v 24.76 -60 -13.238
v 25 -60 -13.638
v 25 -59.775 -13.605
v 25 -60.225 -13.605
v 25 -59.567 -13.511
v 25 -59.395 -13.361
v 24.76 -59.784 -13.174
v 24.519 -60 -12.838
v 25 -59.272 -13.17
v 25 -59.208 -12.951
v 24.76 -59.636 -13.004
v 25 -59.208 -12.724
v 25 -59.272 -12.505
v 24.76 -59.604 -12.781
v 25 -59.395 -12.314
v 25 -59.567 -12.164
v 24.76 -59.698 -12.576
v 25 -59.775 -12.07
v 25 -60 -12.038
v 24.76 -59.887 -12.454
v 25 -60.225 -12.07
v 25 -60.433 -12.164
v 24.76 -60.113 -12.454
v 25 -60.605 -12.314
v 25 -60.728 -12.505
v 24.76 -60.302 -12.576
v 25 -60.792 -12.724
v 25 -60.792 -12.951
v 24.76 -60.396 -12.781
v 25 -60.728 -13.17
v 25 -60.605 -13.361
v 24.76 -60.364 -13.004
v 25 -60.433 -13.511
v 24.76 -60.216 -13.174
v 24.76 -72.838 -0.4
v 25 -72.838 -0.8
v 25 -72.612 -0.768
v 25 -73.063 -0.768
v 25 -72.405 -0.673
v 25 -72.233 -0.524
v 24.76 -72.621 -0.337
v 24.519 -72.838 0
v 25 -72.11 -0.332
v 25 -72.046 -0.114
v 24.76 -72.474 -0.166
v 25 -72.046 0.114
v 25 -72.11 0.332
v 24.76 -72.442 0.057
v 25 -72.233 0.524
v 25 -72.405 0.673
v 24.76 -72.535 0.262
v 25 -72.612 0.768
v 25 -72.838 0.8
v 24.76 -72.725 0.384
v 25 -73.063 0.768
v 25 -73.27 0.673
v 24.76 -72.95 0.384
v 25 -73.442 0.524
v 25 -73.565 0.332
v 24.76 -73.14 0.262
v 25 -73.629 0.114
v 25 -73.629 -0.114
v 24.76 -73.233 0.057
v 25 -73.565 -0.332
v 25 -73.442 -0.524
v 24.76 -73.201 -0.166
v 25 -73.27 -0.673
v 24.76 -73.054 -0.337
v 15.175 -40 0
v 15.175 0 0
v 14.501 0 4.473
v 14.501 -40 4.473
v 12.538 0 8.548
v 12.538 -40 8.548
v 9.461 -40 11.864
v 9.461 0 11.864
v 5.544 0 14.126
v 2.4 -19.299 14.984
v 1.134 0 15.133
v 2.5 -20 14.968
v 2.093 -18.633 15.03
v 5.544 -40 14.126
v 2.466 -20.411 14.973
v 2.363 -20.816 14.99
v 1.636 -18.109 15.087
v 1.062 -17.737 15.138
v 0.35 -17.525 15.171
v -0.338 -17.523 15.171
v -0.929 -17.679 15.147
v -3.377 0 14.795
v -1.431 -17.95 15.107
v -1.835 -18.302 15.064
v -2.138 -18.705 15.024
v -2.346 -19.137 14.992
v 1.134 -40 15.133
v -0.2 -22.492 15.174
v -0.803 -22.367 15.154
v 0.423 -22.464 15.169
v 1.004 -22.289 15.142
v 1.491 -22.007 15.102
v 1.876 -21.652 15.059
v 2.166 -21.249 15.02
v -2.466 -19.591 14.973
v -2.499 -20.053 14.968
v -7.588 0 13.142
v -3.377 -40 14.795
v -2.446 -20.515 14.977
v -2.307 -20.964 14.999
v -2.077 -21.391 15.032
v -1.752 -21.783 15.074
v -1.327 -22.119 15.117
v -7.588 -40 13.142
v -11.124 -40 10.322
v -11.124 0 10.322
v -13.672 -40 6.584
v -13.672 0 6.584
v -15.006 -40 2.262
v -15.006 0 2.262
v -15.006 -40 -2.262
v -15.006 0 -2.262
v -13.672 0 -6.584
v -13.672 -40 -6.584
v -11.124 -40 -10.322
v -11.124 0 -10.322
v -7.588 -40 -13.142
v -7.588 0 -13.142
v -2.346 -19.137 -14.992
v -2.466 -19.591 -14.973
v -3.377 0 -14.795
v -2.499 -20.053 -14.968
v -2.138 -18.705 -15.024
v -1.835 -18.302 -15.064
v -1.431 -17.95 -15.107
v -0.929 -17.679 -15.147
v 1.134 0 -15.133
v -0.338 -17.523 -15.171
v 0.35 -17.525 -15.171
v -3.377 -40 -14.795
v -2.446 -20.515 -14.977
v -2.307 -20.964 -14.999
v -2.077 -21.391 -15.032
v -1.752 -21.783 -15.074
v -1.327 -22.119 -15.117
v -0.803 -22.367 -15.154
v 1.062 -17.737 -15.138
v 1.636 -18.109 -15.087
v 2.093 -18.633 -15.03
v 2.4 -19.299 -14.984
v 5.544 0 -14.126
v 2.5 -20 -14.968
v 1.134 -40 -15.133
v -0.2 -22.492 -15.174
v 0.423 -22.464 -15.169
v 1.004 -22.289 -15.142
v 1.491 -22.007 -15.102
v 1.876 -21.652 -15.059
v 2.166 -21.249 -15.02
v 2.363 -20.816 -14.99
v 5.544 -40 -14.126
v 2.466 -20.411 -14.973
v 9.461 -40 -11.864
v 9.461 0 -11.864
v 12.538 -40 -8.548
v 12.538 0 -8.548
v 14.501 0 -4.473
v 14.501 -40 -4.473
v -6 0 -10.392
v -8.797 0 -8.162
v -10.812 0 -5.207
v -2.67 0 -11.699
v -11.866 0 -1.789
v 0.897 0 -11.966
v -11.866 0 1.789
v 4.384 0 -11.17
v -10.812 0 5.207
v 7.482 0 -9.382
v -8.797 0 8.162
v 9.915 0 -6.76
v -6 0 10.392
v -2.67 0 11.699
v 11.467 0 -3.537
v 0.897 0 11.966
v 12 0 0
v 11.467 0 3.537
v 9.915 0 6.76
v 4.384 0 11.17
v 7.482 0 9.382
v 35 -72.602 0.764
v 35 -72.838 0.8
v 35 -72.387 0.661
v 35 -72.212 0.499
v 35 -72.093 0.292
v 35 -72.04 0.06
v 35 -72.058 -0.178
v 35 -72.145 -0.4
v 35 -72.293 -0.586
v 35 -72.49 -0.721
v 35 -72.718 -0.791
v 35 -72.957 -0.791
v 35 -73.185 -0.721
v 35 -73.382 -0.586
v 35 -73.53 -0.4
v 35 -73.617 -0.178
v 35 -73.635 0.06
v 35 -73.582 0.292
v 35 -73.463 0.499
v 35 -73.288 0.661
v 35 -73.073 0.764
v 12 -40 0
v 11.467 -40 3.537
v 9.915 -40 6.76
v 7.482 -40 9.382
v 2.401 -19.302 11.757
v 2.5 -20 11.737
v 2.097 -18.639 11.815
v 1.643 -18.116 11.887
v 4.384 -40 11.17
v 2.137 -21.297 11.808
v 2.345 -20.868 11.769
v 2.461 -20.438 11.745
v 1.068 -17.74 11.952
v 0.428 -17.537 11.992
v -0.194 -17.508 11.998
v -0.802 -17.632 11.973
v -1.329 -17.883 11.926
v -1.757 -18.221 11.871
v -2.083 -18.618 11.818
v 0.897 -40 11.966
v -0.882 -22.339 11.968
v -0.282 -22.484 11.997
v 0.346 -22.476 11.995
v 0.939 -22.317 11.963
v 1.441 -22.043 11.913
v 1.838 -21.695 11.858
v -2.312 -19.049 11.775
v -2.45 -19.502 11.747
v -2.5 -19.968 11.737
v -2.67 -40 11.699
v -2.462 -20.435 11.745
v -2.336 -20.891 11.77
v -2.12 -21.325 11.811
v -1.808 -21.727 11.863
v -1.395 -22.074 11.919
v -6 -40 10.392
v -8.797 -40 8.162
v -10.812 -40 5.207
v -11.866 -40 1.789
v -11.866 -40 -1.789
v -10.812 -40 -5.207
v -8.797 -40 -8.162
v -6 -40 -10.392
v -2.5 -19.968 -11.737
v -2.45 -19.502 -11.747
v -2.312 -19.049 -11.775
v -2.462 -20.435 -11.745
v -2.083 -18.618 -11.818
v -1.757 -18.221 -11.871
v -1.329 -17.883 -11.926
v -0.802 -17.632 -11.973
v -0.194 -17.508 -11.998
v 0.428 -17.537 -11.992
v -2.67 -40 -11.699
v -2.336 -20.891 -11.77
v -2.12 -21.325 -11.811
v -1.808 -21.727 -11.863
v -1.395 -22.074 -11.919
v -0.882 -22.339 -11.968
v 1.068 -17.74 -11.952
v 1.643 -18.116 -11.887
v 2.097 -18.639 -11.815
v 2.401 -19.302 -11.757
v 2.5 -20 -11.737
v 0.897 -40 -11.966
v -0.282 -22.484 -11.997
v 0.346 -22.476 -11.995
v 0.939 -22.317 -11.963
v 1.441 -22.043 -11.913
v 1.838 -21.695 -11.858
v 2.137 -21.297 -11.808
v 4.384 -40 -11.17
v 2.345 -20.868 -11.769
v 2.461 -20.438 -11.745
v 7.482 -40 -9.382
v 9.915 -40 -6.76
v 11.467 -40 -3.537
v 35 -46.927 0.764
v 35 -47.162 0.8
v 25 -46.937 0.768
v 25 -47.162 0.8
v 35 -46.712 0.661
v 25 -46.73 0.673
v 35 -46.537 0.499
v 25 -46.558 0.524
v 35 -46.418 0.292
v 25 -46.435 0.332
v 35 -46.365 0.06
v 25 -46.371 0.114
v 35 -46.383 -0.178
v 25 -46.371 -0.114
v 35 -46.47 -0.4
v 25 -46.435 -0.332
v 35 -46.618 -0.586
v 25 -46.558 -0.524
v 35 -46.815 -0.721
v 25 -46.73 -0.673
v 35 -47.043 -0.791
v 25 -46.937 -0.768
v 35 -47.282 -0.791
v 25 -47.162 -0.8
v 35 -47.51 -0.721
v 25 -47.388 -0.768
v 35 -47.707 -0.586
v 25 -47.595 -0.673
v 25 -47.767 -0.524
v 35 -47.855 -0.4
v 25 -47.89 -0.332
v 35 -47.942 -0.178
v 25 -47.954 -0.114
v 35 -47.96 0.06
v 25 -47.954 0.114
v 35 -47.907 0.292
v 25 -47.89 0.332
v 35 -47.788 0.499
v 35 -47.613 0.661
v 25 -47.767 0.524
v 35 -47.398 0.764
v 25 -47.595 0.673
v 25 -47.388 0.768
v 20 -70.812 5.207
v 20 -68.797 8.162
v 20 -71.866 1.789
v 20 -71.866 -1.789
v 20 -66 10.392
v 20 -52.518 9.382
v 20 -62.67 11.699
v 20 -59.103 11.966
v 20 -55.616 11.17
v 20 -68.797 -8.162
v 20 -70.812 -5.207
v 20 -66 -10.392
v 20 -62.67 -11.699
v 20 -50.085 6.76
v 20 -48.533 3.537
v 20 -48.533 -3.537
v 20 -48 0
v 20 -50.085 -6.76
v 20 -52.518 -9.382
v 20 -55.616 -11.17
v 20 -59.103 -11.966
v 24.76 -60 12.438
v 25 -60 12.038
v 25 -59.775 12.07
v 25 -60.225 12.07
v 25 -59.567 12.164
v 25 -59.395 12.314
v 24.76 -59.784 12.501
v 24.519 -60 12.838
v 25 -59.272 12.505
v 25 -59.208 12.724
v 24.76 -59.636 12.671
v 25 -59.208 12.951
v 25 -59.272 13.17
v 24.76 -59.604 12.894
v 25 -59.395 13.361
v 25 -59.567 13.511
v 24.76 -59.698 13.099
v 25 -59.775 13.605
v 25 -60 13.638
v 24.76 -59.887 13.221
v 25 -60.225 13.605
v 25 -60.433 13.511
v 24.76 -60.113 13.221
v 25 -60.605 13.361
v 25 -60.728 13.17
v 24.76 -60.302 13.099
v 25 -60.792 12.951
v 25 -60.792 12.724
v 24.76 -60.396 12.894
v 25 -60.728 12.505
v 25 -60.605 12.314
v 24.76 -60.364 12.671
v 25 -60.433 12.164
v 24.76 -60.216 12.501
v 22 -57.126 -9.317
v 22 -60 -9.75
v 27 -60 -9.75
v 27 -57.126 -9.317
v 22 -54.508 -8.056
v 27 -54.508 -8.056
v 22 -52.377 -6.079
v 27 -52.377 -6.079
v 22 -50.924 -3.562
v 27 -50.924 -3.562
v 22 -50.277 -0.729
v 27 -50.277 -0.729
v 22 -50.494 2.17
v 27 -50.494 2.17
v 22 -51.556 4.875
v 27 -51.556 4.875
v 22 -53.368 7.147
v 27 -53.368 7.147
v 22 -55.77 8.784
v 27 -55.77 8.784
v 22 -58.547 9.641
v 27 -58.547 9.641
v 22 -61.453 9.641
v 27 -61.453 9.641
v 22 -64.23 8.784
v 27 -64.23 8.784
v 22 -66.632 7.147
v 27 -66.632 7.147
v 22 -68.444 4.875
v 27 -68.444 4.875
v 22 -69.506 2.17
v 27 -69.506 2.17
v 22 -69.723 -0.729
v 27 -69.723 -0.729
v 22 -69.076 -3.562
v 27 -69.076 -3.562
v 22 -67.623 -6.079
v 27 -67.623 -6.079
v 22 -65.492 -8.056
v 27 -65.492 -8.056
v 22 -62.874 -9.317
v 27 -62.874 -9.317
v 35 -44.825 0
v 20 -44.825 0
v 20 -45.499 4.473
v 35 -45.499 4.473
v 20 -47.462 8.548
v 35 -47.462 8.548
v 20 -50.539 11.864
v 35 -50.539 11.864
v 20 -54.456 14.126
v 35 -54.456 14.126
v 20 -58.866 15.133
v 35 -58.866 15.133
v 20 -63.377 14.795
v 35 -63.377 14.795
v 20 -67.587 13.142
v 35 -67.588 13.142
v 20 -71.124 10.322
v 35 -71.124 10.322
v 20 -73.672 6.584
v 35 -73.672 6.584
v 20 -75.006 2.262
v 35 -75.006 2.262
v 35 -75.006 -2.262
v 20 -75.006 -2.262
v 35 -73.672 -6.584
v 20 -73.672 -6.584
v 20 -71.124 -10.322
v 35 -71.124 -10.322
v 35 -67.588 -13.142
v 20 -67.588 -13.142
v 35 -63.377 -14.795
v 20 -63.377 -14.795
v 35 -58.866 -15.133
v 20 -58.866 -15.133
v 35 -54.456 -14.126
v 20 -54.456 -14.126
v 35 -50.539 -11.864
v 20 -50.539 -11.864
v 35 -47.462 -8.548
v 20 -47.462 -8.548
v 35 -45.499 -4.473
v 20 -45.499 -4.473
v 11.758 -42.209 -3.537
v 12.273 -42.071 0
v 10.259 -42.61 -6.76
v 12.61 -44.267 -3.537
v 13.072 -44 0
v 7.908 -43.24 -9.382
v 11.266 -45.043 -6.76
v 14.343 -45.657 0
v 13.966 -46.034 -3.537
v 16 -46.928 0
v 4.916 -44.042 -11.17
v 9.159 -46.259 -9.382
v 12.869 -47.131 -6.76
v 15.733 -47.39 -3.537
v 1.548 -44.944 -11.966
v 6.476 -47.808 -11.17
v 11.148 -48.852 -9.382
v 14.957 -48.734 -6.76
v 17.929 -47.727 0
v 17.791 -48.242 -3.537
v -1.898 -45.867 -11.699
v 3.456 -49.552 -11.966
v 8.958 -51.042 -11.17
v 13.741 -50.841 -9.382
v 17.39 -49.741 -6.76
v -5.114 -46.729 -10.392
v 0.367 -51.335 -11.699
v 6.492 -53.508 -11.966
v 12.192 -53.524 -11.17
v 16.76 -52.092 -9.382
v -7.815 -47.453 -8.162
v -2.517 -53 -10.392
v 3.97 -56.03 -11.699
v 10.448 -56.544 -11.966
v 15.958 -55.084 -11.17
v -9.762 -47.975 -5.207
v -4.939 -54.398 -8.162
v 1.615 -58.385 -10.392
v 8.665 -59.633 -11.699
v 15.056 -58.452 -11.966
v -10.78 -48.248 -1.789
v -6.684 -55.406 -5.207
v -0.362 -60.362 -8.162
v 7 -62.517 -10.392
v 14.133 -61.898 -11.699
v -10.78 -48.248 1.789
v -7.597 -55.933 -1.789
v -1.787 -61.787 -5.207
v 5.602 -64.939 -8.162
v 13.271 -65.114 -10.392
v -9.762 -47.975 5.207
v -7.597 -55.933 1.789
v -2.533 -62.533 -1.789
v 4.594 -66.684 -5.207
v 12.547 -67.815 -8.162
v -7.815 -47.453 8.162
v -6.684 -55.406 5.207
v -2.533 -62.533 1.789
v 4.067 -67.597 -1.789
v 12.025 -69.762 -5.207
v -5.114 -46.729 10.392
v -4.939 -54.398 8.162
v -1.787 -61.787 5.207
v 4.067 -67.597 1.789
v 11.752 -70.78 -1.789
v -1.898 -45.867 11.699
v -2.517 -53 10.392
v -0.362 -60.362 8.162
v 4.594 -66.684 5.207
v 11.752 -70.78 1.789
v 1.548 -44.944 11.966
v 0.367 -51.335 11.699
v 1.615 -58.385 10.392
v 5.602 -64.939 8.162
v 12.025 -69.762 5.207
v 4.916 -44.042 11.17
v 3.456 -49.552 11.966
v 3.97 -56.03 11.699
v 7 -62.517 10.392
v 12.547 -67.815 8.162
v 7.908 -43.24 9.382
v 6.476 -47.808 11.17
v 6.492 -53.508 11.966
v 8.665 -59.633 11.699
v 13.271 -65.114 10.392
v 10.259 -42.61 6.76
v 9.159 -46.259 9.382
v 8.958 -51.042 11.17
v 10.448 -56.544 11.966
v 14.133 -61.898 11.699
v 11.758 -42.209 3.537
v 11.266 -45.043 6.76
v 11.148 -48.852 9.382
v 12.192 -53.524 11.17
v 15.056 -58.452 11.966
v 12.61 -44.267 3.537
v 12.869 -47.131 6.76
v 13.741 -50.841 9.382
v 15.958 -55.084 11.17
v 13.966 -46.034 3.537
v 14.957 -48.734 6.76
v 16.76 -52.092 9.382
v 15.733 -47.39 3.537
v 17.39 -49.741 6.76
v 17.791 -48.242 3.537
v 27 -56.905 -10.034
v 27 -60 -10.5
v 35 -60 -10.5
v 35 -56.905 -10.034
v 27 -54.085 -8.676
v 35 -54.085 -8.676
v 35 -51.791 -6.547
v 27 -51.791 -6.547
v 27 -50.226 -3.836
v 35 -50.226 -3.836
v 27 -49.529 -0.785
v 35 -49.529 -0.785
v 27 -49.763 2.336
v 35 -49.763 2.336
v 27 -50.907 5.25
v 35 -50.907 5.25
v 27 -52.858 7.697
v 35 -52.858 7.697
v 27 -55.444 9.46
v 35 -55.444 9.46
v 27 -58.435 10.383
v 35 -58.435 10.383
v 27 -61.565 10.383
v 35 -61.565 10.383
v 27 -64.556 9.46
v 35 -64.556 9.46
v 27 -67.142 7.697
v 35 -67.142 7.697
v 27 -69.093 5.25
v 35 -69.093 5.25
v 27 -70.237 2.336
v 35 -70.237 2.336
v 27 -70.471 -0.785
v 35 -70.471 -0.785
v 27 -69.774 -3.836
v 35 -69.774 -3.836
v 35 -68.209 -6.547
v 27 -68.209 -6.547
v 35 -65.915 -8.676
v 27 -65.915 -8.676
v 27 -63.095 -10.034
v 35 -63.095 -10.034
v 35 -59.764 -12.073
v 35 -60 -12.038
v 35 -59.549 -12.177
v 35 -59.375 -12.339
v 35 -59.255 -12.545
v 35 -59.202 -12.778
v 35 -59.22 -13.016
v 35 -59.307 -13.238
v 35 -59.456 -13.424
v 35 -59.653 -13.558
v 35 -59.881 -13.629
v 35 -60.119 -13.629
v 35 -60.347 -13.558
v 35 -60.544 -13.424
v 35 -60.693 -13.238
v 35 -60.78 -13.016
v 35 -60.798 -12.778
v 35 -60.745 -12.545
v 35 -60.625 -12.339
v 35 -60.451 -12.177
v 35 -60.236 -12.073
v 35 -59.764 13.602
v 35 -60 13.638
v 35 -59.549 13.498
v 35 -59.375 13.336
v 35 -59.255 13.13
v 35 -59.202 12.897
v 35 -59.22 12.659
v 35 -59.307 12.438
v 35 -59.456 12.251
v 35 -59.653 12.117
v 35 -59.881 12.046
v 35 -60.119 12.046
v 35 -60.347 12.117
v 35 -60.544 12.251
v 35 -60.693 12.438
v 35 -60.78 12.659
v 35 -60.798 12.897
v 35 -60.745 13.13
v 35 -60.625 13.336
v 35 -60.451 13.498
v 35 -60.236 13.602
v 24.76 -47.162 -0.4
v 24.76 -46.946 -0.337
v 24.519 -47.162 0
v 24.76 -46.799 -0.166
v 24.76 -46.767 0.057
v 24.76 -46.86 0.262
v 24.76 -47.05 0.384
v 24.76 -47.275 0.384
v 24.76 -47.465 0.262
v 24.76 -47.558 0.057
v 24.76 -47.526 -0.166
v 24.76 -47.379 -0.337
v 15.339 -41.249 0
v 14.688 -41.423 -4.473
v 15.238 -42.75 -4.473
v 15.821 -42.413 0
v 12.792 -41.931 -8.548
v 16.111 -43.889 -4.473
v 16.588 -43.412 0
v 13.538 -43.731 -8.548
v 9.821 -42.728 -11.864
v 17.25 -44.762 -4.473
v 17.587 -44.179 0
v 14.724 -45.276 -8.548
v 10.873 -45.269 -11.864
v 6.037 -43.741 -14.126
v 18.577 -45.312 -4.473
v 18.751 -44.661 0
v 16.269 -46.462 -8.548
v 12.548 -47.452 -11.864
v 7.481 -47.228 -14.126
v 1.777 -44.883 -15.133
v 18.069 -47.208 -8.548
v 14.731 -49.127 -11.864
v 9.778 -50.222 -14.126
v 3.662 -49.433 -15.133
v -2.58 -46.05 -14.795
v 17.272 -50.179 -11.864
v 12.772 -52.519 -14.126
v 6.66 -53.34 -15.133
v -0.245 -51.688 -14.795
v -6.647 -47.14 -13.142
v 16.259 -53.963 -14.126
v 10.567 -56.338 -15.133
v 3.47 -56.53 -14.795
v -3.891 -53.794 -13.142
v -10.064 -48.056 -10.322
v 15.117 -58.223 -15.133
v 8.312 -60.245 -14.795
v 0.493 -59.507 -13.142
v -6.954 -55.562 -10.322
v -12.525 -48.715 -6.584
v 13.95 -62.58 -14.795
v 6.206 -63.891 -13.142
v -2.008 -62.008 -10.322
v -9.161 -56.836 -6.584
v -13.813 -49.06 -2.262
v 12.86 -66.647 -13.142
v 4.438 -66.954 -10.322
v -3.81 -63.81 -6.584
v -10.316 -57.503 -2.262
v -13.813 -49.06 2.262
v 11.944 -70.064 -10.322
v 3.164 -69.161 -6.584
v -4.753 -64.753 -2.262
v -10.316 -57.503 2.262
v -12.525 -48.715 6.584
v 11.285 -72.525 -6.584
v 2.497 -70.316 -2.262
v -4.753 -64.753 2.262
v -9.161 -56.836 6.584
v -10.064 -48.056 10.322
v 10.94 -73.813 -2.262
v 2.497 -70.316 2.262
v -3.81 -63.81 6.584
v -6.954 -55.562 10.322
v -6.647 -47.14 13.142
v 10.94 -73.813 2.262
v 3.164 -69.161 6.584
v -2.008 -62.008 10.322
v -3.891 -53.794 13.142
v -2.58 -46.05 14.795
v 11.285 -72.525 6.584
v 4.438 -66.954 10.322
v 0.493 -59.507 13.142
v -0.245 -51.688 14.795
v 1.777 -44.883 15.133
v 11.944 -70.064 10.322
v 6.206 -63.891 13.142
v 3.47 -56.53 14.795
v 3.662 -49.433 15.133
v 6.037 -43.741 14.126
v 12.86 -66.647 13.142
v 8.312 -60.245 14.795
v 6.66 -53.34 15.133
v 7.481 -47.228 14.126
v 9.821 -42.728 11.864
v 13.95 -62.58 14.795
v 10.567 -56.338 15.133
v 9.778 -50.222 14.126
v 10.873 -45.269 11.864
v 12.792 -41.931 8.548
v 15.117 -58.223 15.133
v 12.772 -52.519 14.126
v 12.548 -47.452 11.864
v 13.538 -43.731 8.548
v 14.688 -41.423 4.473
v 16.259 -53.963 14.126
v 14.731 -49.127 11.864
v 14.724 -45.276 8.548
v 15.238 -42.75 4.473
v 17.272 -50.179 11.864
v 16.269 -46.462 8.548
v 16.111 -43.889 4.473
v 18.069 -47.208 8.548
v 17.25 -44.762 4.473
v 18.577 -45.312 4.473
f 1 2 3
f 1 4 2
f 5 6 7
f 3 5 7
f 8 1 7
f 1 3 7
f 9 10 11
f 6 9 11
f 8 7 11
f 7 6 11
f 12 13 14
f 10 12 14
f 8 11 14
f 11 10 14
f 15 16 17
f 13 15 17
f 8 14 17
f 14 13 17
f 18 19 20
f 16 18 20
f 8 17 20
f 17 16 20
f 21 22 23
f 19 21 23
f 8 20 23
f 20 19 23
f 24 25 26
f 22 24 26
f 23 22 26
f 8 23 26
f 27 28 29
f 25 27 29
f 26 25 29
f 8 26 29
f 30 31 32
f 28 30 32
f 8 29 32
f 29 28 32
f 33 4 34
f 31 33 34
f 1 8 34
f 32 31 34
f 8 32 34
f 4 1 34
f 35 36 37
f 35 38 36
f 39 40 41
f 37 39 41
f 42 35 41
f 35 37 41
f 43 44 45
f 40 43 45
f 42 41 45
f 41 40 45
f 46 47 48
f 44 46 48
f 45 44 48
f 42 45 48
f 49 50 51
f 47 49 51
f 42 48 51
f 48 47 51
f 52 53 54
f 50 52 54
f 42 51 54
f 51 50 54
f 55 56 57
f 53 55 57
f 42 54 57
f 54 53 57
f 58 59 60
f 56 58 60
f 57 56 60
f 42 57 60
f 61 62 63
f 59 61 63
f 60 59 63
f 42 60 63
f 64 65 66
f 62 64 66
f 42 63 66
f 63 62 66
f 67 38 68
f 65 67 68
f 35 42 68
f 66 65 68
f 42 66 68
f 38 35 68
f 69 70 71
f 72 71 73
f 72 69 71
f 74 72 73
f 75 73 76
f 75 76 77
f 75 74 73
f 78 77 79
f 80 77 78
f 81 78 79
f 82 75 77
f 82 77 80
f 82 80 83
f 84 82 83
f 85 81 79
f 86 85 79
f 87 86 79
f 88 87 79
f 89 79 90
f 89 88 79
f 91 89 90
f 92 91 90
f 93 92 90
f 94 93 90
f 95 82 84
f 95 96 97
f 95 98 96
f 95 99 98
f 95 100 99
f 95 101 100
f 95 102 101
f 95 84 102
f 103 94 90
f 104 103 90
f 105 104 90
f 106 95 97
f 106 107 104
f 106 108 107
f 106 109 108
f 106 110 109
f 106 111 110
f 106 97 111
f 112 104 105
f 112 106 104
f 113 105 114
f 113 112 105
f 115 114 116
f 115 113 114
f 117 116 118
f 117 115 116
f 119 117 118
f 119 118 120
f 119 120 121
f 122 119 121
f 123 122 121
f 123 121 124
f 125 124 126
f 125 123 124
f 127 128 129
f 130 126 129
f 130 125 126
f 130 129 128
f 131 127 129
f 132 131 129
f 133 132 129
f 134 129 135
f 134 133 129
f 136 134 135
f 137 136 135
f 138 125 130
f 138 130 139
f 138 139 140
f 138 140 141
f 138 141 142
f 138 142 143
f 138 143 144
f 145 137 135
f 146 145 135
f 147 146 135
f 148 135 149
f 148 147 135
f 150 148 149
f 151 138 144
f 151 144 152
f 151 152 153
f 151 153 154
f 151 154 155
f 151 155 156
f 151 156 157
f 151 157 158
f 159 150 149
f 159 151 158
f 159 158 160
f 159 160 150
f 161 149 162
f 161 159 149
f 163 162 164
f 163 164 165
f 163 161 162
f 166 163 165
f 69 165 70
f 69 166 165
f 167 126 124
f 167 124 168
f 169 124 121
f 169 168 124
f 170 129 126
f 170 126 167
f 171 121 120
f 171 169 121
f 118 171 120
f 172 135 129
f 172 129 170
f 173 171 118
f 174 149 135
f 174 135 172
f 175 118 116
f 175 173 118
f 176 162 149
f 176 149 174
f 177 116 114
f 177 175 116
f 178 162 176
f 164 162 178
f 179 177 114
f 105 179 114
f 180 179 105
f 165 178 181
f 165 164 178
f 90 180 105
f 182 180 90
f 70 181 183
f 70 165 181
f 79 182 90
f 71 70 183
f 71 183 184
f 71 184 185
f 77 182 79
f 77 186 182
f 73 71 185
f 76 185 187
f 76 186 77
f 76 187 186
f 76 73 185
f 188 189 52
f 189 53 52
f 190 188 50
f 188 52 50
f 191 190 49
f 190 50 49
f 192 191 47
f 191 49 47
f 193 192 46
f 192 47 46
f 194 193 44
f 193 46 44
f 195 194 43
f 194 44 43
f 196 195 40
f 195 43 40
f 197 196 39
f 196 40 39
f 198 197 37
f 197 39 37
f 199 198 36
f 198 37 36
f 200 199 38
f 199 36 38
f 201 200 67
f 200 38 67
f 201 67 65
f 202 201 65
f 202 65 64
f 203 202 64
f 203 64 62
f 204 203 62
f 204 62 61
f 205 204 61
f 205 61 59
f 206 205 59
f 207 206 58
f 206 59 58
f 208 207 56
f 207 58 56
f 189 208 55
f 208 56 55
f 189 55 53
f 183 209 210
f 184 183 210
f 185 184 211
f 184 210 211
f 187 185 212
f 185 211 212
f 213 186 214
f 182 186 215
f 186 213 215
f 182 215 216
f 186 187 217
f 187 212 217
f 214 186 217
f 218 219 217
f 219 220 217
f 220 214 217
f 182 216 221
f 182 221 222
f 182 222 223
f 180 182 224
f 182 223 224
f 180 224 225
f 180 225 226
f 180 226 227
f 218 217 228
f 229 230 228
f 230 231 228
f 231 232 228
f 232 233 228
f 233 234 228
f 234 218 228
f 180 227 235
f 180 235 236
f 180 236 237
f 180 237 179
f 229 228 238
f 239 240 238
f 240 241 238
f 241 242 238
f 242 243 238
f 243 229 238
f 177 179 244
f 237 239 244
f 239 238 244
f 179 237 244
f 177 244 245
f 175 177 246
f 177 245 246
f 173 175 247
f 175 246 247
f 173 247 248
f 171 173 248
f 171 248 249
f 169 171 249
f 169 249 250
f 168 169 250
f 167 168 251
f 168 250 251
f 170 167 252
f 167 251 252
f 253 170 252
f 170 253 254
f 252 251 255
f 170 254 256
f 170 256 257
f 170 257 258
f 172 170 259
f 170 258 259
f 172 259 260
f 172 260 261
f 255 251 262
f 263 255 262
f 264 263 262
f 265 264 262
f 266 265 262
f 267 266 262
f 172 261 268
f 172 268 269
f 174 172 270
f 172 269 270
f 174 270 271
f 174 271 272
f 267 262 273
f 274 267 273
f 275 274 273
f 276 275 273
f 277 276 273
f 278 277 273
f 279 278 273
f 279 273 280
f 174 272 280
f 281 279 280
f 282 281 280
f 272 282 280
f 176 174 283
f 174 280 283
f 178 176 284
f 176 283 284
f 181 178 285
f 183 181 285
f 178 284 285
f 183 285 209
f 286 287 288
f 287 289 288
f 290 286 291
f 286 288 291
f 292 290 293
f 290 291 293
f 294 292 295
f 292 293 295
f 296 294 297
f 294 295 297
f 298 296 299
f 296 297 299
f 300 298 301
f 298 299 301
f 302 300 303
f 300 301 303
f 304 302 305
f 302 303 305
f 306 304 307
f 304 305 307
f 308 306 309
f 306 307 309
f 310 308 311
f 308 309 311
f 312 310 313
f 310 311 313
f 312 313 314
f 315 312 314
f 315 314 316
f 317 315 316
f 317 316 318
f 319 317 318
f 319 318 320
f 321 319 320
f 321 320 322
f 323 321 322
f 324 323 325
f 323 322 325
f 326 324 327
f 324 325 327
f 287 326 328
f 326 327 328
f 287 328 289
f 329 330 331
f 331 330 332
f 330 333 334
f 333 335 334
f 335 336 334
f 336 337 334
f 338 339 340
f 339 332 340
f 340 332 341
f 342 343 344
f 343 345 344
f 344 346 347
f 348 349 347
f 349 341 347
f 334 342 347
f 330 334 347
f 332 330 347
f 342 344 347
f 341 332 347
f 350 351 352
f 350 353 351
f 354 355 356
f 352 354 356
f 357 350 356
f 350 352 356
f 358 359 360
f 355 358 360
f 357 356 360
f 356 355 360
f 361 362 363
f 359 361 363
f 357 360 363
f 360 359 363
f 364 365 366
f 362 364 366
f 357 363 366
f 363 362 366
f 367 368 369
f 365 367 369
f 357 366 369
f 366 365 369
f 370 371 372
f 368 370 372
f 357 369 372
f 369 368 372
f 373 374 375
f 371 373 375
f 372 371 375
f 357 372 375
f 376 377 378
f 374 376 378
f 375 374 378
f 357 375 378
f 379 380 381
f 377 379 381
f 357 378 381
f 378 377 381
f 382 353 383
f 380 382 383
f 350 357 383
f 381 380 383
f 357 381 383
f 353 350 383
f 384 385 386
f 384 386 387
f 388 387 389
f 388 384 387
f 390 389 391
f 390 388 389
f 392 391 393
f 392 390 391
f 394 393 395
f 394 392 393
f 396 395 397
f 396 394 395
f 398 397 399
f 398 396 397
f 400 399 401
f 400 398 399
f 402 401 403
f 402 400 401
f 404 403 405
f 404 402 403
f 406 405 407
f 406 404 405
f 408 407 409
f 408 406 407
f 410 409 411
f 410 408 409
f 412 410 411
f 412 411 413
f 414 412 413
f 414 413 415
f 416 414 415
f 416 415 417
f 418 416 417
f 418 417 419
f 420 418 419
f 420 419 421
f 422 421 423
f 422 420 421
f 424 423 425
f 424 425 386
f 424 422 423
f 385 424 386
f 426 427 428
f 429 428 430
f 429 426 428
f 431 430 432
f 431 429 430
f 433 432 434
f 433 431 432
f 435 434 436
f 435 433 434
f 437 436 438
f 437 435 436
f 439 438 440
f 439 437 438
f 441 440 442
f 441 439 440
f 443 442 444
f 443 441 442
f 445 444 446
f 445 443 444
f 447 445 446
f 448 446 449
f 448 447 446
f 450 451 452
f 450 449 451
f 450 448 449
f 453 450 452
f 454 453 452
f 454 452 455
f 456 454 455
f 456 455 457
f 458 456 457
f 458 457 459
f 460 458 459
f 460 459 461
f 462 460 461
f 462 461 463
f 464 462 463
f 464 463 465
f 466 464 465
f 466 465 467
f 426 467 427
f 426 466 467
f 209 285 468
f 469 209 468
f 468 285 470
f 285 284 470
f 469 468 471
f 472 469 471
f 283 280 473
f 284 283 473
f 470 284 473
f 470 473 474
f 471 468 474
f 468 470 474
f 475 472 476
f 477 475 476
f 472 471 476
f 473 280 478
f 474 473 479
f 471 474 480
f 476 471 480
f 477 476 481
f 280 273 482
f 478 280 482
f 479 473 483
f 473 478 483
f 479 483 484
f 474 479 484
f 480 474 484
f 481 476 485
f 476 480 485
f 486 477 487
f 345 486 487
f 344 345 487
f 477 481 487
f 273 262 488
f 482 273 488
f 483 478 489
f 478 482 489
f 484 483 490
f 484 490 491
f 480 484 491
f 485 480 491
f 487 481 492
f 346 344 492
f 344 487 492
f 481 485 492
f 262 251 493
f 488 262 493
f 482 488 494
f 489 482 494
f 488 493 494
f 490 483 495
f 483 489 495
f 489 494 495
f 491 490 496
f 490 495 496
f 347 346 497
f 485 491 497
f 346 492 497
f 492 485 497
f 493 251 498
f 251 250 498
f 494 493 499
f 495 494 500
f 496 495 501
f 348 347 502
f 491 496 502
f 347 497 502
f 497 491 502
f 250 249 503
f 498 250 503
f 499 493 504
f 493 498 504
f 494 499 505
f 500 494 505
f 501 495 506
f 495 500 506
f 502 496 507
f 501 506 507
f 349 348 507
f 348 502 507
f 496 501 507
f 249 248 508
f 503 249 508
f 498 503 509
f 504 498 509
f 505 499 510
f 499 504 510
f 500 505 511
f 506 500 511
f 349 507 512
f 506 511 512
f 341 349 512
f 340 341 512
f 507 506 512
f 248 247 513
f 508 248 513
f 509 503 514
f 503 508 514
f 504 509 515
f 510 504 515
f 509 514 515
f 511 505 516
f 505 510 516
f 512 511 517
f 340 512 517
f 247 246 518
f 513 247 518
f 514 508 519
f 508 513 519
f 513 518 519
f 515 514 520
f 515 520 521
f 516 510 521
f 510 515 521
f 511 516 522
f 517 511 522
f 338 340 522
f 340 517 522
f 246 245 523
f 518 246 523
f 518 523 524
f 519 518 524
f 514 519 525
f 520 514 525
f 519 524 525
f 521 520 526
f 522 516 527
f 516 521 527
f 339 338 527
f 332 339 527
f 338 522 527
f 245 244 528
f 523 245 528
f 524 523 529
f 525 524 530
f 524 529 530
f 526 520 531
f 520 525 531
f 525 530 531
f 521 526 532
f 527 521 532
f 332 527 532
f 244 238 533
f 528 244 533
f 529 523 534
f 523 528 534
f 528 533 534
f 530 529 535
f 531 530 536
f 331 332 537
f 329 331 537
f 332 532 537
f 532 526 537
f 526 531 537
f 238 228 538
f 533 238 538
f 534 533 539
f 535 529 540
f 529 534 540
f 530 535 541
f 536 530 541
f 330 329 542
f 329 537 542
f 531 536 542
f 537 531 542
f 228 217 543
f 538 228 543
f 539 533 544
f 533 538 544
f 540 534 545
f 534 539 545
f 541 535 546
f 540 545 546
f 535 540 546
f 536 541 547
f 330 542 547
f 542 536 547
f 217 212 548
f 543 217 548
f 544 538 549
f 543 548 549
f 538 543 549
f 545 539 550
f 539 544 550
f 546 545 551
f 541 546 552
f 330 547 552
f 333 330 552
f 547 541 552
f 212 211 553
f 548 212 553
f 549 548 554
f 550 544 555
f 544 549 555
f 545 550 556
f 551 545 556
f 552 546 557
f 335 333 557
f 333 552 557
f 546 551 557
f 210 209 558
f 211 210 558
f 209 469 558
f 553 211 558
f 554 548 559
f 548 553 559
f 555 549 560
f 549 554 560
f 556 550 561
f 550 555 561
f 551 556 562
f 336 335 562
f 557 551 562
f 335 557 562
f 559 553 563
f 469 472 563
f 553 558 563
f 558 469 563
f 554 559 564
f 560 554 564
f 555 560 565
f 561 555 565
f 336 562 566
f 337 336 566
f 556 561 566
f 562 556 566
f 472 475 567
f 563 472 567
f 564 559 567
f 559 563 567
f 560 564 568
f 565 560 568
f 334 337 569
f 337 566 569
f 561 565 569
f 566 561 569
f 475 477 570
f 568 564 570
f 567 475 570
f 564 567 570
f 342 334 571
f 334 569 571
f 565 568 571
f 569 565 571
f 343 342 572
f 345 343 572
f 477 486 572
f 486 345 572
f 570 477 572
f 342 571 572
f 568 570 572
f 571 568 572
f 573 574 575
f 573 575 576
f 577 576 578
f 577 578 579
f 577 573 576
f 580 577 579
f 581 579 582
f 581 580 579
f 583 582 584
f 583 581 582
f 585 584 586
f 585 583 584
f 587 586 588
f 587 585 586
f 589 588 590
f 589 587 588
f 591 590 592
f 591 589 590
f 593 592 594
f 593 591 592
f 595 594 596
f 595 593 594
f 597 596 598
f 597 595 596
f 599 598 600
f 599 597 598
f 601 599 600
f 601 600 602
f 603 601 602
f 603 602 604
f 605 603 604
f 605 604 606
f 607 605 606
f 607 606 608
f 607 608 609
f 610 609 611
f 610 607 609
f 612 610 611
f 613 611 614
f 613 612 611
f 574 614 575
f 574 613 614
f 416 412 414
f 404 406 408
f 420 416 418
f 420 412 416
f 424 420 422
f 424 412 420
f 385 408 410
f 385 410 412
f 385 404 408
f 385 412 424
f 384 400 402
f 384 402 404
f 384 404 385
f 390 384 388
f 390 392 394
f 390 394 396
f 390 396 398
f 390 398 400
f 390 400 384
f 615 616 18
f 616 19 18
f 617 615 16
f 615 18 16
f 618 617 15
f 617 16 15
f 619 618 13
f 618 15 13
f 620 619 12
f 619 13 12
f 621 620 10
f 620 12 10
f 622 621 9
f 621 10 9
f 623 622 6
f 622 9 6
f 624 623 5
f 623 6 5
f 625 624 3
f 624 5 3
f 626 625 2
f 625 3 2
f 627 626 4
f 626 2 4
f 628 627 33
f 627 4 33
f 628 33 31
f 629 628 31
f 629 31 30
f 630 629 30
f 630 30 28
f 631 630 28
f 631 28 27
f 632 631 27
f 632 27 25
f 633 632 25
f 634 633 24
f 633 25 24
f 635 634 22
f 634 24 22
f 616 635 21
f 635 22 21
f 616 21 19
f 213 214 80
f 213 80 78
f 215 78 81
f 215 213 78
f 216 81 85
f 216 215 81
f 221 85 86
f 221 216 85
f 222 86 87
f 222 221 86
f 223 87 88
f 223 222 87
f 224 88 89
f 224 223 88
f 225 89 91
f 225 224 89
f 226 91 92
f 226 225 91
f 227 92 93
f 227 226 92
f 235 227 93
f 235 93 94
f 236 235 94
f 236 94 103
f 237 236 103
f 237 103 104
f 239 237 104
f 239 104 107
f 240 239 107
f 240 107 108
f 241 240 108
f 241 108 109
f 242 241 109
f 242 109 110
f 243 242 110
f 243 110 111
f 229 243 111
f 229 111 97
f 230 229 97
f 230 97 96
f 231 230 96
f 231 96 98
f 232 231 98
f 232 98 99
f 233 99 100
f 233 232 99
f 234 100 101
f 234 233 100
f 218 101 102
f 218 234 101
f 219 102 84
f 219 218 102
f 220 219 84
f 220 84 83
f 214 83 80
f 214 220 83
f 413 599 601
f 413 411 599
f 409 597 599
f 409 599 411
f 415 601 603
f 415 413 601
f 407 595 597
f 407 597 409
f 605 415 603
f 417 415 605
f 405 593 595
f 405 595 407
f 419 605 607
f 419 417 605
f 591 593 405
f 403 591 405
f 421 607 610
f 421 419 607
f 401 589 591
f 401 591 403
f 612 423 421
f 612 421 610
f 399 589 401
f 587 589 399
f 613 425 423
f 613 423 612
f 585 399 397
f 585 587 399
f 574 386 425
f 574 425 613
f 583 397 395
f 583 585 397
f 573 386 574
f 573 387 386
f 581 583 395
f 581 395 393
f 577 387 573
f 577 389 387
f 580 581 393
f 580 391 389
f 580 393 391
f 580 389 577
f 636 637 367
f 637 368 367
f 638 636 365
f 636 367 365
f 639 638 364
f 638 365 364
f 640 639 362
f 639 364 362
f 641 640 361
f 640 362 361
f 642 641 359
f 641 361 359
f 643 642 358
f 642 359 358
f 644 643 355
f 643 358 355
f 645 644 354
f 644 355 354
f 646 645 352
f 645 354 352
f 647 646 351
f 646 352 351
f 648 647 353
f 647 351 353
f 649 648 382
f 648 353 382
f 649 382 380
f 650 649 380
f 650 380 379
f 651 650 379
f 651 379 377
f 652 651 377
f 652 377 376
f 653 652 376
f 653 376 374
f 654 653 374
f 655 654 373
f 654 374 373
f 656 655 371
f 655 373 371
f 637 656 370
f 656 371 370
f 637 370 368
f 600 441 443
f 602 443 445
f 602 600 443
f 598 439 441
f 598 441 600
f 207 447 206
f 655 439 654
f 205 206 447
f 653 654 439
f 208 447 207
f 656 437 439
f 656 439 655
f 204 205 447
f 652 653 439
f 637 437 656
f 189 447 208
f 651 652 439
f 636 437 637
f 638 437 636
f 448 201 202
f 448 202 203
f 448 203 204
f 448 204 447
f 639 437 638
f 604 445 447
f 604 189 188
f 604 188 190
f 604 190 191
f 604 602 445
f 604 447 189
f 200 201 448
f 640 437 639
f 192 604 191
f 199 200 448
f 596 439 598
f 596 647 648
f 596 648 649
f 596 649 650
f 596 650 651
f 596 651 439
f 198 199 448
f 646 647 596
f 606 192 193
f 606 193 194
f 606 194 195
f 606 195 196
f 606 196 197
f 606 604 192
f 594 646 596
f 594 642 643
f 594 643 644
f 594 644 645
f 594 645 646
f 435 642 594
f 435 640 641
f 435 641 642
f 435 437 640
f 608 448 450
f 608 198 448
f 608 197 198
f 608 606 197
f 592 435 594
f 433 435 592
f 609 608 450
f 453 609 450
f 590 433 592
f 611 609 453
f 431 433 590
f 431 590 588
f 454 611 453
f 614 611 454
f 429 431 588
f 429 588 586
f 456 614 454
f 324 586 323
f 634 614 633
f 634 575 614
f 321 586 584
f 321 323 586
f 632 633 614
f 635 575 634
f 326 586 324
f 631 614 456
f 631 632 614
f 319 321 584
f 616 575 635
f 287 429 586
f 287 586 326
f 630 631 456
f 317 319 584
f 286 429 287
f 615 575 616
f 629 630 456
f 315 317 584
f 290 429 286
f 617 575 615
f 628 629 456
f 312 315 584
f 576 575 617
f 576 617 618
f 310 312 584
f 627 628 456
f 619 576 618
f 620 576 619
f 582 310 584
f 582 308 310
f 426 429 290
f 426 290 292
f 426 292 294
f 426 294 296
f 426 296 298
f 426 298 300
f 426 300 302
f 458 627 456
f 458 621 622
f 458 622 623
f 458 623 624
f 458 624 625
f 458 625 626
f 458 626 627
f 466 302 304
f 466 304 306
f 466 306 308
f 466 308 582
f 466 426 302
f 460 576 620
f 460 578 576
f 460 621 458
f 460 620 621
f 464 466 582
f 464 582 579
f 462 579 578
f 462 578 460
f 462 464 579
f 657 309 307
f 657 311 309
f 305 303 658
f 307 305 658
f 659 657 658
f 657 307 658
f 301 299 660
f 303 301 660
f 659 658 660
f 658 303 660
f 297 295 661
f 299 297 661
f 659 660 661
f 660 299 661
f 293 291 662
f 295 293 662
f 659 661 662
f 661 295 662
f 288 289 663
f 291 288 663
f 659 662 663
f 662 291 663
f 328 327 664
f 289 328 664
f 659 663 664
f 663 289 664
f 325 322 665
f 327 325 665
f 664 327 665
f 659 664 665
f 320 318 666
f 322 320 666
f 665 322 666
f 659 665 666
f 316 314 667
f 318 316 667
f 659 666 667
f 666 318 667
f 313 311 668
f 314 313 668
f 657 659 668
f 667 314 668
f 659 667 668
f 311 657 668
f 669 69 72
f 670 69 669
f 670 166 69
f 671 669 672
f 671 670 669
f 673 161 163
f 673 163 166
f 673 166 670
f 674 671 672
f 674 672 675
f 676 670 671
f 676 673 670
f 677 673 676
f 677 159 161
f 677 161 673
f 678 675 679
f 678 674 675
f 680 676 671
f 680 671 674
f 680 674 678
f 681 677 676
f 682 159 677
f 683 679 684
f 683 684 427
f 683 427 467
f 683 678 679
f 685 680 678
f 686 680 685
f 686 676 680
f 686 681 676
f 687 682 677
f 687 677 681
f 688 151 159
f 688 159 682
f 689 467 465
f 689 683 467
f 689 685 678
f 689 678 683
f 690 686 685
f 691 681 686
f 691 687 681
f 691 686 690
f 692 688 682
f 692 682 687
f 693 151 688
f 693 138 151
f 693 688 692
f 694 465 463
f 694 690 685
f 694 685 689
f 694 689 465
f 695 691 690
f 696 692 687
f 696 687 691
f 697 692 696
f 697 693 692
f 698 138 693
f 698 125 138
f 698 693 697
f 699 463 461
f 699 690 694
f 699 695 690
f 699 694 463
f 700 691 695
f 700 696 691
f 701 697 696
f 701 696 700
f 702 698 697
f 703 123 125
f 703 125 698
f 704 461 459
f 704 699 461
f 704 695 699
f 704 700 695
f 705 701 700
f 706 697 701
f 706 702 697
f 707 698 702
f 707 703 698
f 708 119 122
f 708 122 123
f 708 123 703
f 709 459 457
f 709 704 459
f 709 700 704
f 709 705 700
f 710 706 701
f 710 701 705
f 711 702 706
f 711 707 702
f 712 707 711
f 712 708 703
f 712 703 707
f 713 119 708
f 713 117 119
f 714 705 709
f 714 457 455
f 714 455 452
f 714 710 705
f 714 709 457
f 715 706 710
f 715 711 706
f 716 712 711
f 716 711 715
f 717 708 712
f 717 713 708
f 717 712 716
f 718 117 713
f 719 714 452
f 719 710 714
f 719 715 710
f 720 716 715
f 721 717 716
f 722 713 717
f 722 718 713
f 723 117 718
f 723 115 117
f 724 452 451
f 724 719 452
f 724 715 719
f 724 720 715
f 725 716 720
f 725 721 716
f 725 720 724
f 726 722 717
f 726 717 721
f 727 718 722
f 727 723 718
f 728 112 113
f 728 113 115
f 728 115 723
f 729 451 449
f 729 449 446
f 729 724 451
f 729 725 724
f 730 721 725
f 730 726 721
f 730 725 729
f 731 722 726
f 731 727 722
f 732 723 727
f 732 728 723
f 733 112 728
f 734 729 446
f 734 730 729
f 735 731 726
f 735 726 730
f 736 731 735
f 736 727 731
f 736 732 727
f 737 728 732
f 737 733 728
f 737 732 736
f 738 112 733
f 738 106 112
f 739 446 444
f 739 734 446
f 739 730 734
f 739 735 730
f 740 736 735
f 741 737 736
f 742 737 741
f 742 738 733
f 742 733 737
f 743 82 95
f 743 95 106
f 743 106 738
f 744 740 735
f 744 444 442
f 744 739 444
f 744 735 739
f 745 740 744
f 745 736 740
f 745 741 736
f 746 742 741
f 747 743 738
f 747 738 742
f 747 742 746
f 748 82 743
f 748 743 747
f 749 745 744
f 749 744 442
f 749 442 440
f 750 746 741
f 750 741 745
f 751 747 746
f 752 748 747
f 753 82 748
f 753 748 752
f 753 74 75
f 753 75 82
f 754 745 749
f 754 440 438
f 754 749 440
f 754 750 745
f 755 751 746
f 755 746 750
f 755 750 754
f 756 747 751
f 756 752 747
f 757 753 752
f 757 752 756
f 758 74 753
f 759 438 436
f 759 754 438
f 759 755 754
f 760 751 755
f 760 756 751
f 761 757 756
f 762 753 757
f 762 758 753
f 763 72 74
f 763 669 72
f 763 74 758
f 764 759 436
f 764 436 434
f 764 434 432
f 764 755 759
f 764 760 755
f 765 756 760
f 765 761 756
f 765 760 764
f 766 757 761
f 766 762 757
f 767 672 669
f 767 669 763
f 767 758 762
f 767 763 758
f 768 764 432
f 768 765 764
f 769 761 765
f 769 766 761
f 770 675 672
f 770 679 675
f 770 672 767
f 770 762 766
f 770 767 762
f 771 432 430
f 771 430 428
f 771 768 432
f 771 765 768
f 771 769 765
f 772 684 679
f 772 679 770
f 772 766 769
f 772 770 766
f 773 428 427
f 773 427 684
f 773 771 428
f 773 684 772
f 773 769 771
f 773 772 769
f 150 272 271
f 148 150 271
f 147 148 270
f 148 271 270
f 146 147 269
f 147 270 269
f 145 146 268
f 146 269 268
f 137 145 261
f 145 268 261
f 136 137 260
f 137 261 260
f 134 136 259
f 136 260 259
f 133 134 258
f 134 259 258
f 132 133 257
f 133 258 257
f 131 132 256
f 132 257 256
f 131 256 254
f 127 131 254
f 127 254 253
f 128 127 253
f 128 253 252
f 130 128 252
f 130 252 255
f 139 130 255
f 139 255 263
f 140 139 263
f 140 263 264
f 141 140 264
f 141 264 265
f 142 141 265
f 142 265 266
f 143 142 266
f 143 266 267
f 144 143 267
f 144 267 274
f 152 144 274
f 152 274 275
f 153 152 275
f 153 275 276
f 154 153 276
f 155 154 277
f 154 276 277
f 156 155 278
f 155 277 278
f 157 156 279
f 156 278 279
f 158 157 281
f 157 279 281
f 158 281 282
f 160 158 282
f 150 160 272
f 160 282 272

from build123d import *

# Parameters (mm, degrees)
SKETCH1_R                       = 15.175
SKETCH1_R_2                     = 12
SKETCH3_R                       = 12
BOSS_EXTRUDE1_DEPTH             = 2
SKETCH4_R                       = 12
SKETCH4_R_2                     = 9.75
BOSS_EXTRUDE4_DEPTH             = 5
SKETCH6_R                       = 12
SKETCH6_R_2                     = 10.5
BOSS_EXTRUDE5_DEPTH             = 8
SKETCH7_R                       = 2.5
CUT_EXTRUDE2_DEPTH              = 16.1750001
CUT_EXTRUDE2_DEPTH_BACK         = 16.1750001
TAP_DRILL_FOR_M2X0_4_TAP1_D     = 1.6
TAP_DRILL_FOR_M2X0_4_TAP1_DEPTH = 10
TAP_DRILL_FOR_M2X0_4_TAP1_TIP   = 0.480688495


with BuildPart() as part:
    # Sweep1: sweep along a path in Sketch2
    with BuildLine(Plane.XY) as sweep1_path:
        Line((0, 0), (0, -40))
        ThreePointArc((0, -40), (5.857864376, -54.142135624), (20, -60))
        Line((20, -60), (35, -60))
    # Sketch1 → Sweep1 (sweep)
    with BuildSketch(Plane(origin=(0, 0, 0), x_dir=(1, 0, 0), z_dir=(0, 1, 0))):
        Circle(SKETCH1_R)
        Circle(SKETCH1_R_2, mode=Mode.SUBTRACT)
    sweep(path=sweep1_path.line)

    # Sketch3 → Boss-Extrude1 (add)
    with BuildSketch(Plane(origin=(20, 0, 0), x_dir=(0, 0, -1), z_dir=(1, 0, 0))):
        with Locations((0, -60)):
            Circle(SKETCH3_R)
    extrude(amount=BOSS_EXTRUDE1_DEPTH)

    # Sketch4 → Boss-Extrude4 (add)
    with BuildSketch(Plane(origin=(22, 0, 0), x_dir=(0, 0, -1), z_dir=(1, 0, 0))):
        with Locations((0, -60)):
            Circle(SKETCH4_R)
        with Locations((0, -60)):
            Circle(SKETCH4_R_2, mode=Mode.SUBTRACT)
    extrude(amount=BOSS_EXTRUDE4_DEPTH)

    # Sketch6 → Boss-Extrude5 (add)
    with BuildSketch(Plane(origin=(27, 0, 0), x_dir=(0, 0, -1), z_dir=(1, 0, 0))):
        with Locations((0, -60)):
            Circle(SKETCH6_R)
        with Locations((0, -60)):
            Circle(SKETCH6_R_2, mode=Mode.SUBTRACT)
    extrude(amount=BOSS_EXTRUDE5_DEPTH)

    # Sketch7 → Cut-Extrude2 (cut, two sides)
    with BuildSketch(Plane.XY) as cut_extrude2_sk:
        with Locations((0, -20)):
            Circle(SKETCH7_R)
    extrude(amount=CUT_EXTRUDE2_DEPTH, mode=Mode.SUBTRACT)
    extrude(cut_extrude2_sk.sketch, amount=-CUT_EXTRUDE2_DEPTH_BACK, mode=Mode.SUBTRACT)

    # Tap Drill for M2x0.4 Tap1
    with Locations(Plane(origin=(35, 0, 0), x_dir=(0, 0, -1), z_dir=(1, 0, 0))):
        with Locations((0, -47.1625), (12.8375, -60), (0, -72.8375), (-12.8375, -60)):
            Hole(TAP_DRILL_FOR_M2X0_4_TAP1_D / 2, depth=TAP_DRILL_FOR_M2X0_4_TAP1_DEPTH)
            with Locations((0, 0, -(TAP_DRILL_FOR_M2X0_4_TAP1_DEPTH + TAP_DRILL_FOR_M2X0_4_TAP1_TIP / 2))):  # 118° drill point
                Cone(0, TAP_DRILL_FOR_M2X0_4_TAP1_D / 2, TAP_DRILL_FOR_M2X0_4_TAP1_TIP, mode=Mode.SUBTRACT)


solid = part.part
